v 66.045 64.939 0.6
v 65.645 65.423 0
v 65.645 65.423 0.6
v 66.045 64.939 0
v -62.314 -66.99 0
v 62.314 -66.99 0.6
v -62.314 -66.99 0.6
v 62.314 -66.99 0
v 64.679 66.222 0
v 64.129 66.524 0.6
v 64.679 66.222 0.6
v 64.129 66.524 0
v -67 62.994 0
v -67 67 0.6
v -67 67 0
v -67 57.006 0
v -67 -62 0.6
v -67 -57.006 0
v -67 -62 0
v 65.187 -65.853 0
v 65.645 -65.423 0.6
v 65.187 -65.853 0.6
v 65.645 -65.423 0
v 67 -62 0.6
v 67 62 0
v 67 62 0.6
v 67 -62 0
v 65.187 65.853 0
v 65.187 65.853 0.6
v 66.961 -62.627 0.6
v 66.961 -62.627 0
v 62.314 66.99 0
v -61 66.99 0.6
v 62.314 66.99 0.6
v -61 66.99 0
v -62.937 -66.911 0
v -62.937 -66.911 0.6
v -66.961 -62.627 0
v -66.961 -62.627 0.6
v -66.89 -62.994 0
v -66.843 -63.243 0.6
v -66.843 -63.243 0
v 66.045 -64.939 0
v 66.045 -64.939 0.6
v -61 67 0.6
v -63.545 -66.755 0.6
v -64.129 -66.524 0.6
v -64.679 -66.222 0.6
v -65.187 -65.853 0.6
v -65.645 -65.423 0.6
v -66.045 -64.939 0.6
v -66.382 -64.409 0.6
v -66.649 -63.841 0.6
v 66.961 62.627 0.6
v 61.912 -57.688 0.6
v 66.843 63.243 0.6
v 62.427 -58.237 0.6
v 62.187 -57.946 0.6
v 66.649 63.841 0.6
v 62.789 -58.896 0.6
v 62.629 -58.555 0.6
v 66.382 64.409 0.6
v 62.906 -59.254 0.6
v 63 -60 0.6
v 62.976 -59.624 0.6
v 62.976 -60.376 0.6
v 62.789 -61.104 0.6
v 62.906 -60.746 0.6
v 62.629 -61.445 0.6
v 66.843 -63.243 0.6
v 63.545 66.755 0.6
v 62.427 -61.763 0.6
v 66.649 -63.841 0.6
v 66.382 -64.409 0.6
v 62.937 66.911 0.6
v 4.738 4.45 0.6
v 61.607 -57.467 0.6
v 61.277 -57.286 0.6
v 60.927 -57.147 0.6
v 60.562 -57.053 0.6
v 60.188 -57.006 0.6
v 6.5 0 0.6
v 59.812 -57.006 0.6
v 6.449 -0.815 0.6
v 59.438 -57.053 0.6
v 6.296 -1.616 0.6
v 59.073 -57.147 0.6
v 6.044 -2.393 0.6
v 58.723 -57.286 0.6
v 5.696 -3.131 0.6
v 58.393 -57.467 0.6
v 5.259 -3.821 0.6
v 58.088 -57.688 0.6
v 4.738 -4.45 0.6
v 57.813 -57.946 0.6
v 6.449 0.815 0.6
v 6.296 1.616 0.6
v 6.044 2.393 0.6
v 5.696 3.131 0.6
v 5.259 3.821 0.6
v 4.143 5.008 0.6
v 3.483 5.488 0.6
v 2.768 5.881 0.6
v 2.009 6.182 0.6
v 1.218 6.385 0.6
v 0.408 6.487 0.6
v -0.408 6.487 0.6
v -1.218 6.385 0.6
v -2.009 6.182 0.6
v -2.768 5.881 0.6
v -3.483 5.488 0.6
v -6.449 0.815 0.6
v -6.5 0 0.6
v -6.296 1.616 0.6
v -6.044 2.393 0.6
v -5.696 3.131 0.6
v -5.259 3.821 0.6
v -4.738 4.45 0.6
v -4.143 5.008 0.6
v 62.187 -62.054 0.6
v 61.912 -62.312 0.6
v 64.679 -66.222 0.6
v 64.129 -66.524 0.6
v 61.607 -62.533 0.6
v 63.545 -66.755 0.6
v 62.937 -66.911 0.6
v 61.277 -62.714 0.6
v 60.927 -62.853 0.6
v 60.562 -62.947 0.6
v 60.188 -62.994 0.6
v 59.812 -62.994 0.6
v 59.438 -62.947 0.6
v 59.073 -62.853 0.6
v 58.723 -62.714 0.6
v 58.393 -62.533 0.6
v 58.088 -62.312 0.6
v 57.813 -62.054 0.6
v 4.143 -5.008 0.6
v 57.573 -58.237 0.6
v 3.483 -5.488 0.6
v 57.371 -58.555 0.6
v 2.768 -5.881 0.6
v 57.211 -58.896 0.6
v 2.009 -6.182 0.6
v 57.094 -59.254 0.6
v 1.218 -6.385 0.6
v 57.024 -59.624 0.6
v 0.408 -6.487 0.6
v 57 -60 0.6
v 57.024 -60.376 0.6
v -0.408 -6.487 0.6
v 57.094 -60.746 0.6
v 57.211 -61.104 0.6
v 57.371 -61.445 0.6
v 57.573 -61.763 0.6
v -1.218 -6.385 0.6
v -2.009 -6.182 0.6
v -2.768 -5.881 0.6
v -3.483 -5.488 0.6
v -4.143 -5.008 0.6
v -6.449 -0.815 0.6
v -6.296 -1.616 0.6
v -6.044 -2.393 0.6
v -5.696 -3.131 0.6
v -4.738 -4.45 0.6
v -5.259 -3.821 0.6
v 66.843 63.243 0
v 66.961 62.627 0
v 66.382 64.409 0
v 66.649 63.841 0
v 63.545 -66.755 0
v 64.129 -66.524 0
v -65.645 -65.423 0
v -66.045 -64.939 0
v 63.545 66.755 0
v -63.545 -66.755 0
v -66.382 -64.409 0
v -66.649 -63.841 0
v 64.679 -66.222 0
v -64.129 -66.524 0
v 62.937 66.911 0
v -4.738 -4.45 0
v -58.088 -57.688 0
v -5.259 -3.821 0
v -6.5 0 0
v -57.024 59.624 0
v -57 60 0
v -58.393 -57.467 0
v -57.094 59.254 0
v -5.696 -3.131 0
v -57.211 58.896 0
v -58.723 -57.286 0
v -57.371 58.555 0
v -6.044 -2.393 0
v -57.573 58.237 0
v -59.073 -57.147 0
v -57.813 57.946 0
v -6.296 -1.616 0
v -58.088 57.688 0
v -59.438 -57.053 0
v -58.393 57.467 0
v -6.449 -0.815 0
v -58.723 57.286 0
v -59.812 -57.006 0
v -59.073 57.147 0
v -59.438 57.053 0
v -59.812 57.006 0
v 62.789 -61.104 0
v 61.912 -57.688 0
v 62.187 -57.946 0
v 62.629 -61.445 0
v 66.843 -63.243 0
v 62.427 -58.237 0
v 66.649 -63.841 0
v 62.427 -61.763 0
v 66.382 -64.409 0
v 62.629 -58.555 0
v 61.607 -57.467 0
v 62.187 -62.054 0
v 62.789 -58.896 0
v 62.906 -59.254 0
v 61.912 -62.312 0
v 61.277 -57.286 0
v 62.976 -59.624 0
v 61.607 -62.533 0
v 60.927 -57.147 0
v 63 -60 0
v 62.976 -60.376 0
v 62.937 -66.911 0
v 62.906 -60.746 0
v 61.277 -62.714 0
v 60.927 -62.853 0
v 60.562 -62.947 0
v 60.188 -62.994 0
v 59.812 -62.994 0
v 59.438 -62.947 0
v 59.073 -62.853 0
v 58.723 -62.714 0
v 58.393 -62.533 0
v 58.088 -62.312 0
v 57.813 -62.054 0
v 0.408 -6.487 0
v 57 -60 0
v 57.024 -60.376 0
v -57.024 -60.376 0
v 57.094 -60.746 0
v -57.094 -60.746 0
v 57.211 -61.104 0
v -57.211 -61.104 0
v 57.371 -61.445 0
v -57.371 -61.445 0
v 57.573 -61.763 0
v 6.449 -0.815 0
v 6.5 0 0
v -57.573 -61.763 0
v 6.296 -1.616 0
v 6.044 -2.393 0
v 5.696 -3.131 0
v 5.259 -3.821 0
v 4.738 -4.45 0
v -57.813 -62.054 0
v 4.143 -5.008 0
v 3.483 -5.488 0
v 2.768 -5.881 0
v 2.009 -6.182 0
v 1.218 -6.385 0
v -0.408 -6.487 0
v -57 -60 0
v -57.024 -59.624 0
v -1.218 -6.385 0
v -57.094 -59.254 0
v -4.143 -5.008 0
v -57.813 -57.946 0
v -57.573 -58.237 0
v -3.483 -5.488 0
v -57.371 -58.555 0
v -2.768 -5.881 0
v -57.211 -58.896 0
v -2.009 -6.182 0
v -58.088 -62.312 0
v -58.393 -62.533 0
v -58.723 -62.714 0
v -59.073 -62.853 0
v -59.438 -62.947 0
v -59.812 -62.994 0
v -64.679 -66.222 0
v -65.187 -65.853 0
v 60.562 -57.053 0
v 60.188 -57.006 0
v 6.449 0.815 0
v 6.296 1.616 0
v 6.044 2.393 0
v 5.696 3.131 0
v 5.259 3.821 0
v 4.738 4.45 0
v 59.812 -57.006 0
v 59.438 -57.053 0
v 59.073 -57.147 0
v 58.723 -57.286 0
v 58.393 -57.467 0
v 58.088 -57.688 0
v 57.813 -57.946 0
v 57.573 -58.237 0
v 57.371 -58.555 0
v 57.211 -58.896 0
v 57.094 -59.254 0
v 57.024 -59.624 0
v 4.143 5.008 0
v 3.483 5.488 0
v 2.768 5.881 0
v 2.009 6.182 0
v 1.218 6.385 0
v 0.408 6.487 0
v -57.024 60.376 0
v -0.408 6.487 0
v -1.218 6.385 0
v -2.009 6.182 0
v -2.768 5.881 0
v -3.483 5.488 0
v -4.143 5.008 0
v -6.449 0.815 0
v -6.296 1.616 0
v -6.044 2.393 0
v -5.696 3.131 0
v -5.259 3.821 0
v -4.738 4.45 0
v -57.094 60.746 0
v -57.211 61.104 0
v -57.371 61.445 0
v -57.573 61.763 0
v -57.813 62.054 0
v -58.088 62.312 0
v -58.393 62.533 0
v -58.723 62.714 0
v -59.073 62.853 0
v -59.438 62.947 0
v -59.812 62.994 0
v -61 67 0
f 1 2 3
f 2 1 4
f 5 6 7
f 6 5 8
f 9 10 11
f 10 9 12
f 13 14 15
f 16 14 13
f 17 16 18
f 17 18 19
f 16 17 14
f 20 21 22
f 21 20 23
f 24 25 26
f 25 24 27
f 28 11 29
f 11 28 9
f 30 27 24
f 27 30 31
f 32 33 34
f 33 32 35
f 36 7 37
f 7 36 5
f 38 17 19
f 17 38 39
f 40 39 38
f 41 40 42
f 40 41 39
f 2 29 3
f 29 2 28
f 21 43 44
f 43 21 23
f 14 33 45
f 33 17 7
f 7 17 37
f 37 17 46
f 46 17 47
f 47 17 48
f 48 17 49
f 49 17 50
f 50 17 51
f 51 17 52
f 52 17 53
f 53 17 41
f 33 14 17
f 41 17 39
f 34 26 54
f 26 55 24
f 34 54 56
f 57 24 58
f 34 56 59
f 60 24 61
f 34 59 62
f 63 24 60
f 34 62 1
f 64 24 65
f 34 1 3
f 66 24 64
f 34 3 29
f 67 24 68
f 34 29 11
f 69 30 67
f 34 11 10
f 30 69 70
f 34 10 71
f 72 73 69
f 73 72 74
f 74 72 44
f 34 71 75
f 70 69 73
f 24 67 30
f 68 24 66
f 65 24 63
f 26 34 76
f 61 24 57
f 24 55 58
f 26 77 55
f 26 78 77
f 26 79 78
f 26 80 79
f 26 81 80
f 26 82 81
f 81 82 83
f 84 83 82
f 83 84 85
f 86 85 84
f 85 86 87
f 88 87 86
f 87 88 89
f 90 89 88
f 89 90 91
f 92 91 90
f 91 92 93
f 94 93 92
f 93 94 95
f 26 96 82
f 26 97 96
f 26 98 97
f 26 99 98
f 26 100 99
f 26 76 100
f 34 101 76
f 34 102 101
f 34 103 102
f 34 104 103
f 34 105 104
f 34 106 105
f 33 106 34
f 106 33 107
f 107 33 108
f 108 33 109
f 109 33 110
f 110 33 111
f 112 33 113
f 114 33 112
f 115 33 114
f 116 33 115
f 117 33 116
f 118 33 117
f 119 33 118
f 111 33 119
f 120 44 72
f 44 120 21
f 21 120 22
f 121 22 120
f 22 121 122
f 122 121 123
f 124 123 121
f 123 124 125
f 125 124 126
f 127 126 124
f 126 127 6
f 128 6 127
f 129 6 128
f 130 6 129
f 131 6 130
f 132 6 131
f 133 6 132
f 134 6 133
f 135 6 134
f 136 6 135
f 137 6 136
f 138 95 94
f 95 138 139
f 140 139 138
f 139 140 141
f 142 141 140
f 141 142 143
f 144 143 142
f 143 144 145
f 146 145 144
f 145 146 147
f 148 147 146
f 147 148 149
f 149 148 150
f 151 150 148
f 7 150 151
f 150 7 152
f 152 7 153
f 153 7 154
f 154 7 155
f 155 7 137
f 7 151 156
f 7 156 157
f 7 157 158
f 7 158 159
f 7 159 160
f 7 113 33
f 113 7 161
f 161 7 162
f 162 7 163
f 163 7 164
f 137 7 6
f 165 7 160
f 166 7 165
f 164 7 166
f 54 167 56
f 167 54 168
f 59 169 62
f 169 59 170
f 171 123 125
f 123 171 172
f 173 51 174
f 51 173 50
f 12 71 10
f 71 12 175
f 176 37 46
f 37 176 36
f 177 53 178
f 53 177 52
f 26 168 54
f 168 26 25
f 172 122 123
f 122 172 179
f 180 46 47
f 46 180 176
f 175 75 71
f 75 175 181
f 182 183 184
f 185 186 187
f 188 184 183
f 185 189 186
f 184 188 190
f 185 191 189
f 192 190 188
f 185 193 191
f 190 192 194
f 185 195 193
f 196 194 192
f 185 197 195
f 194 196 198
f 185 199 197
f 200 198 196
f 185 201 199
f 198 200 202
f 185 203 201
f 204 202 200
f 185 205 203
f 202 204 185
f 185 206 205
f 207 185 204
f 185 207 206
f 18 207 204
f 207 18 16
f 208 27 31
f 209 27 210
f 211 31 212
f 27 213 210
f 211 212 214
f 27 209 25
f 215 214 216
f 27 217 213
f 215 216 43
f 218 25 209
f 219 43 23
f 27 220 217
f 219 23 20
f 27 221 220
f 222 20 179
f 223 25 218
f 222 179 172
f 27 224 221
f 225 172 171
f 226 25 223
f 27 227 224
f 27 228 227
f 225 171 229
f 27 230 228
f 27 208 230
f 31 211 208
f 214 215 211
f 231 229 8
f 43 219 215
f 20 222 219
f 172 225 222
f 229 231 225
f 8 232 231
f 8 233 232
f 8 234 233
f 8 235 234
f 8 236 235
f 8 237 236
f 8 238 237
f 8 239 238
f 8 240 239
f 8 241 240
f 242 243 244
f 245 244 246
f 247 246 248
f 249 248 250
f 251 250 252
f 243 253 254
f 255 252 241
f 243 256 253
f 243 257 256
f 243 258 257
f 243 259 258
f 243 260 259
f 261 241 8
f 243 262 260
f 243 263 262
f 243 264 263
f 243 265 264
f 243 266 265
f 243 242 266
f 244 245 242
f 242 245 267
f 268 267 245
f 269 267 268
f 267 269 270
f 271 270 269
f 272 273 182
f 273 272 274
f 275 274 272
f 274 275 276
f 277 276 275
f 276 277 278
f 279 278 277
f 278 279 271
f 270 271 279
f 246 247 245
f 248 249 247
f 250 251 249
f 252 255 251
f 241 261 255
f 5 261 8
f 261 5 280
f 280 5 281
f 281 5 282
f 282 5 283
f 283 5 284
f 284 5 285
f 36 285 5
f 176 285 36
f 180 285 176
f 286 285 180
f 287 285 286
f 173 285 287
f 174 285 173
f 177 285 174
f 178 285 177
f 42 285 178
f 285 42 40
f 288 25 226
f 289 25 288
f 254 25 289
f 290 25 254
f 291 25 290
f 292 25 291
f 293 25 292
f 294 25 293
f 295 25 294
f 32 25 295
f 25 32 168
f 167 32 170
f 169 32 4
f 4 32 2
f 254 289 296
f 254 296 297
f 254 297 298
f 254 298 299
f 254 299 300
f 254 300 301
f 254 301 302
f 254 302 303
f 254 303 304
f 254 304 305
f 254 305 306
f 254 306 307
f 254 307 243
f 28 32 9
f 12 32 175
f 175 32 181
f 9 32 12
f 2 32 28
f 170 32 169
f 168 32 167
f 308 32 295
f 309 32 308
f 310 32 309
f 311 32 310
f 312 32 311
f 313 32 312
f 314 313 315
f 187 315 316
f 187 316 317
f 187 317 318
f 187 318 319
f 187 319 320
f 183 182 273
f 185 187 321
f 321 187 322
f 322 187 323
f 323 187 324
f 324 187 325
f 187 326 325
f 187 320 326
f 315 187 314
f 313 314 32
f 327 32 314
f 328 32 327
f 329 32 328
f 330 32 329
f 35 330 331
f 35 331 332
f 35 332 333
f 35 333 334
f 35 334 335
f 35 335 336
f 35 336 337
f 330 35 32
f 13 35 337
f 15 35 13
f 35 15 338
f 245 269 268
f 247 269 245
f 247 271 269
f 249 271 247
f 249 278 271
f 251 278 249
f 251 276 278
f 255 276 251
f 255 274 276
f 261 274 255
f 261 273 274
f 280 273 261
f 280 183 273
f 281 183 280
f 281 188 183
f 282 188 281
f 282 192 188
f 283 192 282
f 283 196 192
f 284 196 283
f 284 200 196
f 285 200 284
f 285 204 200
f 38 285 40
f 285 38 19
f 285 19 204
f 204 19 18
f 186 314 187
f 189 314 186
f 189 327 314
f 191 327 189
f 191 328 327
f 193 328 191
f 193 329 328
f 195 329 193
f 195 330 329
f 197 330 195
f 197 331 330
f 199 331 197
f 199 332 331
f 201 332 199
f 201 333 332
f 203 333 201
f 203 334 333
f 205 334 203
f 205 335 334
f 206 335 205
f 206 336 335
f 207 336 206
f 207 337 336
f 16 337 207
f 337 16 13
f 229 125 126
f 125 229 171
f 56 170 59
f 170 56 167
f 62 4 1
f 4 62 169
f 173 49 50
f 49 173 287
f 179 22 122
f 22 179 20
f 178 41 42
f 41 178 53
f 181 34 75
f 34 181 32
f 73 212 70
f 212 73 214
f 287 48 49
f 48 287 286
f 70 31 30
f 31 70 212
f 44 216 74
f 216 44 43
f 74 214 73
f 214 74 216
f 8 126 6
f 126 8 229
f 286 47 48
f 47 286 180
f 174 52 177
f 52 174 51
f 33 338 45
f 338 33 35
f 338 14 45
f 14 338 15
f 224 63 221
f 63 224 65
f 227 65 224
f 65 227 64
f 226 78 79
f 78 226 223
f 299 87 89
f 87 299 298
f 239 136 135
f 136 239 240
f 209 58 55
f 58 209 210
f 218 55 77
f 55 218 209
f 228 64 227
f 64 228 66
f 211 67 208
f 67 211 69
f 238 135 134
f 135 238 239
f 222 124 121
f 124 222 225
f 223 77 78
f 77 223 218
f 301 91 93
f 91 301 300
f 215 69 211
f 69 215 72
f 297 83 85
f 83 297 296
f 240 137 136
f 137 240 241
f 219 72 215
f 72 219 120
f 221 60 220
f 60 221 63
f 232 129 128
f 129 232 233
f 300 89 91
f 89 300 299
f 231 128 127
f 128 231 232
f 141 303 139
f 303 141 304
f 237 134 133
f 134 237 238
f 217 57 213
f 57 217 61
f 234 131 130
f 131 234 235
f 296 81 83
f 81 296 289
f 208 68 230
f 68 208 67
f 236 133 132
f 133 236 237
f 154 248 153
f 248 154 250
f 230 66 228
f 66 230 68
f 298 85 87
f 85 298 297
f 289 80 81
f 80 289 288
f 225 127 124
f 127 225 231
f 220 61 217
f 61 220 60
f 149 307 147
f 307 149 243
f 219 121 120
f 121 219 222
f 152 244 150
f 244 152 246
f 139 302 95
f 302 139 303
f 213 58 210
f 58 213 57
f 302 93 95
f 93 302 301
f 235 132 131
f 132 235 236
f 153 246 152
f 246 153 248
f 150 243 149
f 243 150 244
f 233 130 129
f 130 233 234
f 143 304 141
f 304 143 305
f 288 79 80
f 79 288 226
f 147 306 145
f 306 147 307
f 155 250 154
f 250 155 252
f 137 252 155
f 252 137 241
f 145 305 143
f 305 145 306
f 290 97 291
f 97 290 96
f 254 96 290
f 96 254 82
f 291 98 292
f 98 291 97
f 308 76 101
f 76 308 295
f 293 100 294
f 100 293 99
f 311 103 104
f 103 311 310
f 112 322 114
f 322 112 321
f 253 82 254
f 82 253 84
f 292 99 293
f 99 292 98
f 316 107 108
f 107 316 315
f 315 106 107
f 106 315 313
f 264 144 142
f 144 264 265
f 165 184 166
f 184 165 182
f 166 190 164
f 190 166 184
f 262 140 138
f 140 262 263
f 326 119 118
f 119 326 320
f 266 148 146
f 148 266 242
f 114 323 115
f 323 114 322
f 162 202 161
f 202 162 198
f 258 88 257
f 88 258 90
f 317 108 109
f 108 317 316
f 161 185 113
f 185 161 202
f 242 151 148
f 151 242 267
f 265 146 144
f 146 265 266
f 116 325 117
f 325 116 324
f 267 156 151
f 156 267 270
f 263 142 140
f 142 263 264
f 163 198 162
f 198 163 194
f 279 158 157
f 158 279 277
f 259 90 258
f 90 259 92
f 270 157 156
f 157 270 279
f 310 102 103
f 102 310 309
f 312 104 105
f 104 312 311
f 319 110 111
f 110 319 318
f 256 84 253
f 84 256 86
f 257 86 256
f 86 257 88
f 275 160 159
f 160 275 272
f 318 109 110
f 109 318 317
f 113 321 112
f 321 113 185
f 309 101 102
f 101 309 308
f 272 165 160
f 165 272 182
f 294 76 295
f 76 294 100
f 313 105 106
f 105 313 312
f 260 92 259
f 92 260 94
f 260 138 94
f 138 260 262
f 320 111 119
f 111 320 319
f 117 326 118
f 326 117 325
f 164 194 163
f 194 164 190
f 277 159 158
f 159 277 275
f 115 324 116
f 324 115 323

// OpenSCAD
$fn = 50;


difference() {
	union() {
		hull() {
			translate(v = [-62.0000000000, 62.0000000000, 0]) {
				cylinder(h = 0.6000000000, r = 5);
			}
			translate(v = [62.0000000000, 62.0000000000, 0]) {
				cylinder(h = 0.6000000000, r = 5);
			}
			translate(v = [-62.0000000000, -62.0000000000, 0]) {
				cylinder(h = 0.6000000000, r = 5);
			}
			translate(v = [62.0000000000, -62.0000000000, 0]) {
				cylinder(h = 0.6000000000, r = 5);
			}
		}
		translate(v = [-67.0000000000, 61.0000000000, 0]) {
			cube(size = [6, 6, 0.6000000000]);
		}
	}
	union() {
		translate(v = [-67.5000000000, -60.0000000000, -250.0000000000]) {
			rotate(a = [0, 0, 0]) {
				difference() {
					union() {
						hull() {
							translate(v = [7.5000000000, 0, 0]) {
								cylinder(h = 250, r = 3.0000000000, r1 = 3.0000000000, r2 = 3.0000000000);
							}
							translate(v = [-7.5000000000, 0, 0]) {
								cylinder(h = 250, r = 3.0000000000, r1 = 3.0000000000, r2 = 3.0000000000);
							}
						}
					}
					union();
				}
			}
		}
		translate(v = [-67.5000000000, 60.0000000000, -250.0000000000]) {
			rotate(a = [0, 0, 0]) {
				difference() {
					union() {
						hull() {
							translate(v = [7.5000000000, 0, 0]) {
								cylinder(h = 250, r = 3.0000000000, r1 = 3.0000000000, r2 = 3.0000000000);
							}
							translate(v = [-7.5000000000, 0, 0]) {
								cylinder(h = 250, r = 3.0000000000, r1 = 3.0000000000, r2 = 3.0000000000);
							}
						}
					}
					union();
				}
			}
		}
		translate(v = [60.0000000000, -60.0000000000, 0]) {
			cylinder(h = 100, r = 3.0000000000);
		}
		cylinder(h = 0.6000000000, r = 6.5000000000);
	}
}
